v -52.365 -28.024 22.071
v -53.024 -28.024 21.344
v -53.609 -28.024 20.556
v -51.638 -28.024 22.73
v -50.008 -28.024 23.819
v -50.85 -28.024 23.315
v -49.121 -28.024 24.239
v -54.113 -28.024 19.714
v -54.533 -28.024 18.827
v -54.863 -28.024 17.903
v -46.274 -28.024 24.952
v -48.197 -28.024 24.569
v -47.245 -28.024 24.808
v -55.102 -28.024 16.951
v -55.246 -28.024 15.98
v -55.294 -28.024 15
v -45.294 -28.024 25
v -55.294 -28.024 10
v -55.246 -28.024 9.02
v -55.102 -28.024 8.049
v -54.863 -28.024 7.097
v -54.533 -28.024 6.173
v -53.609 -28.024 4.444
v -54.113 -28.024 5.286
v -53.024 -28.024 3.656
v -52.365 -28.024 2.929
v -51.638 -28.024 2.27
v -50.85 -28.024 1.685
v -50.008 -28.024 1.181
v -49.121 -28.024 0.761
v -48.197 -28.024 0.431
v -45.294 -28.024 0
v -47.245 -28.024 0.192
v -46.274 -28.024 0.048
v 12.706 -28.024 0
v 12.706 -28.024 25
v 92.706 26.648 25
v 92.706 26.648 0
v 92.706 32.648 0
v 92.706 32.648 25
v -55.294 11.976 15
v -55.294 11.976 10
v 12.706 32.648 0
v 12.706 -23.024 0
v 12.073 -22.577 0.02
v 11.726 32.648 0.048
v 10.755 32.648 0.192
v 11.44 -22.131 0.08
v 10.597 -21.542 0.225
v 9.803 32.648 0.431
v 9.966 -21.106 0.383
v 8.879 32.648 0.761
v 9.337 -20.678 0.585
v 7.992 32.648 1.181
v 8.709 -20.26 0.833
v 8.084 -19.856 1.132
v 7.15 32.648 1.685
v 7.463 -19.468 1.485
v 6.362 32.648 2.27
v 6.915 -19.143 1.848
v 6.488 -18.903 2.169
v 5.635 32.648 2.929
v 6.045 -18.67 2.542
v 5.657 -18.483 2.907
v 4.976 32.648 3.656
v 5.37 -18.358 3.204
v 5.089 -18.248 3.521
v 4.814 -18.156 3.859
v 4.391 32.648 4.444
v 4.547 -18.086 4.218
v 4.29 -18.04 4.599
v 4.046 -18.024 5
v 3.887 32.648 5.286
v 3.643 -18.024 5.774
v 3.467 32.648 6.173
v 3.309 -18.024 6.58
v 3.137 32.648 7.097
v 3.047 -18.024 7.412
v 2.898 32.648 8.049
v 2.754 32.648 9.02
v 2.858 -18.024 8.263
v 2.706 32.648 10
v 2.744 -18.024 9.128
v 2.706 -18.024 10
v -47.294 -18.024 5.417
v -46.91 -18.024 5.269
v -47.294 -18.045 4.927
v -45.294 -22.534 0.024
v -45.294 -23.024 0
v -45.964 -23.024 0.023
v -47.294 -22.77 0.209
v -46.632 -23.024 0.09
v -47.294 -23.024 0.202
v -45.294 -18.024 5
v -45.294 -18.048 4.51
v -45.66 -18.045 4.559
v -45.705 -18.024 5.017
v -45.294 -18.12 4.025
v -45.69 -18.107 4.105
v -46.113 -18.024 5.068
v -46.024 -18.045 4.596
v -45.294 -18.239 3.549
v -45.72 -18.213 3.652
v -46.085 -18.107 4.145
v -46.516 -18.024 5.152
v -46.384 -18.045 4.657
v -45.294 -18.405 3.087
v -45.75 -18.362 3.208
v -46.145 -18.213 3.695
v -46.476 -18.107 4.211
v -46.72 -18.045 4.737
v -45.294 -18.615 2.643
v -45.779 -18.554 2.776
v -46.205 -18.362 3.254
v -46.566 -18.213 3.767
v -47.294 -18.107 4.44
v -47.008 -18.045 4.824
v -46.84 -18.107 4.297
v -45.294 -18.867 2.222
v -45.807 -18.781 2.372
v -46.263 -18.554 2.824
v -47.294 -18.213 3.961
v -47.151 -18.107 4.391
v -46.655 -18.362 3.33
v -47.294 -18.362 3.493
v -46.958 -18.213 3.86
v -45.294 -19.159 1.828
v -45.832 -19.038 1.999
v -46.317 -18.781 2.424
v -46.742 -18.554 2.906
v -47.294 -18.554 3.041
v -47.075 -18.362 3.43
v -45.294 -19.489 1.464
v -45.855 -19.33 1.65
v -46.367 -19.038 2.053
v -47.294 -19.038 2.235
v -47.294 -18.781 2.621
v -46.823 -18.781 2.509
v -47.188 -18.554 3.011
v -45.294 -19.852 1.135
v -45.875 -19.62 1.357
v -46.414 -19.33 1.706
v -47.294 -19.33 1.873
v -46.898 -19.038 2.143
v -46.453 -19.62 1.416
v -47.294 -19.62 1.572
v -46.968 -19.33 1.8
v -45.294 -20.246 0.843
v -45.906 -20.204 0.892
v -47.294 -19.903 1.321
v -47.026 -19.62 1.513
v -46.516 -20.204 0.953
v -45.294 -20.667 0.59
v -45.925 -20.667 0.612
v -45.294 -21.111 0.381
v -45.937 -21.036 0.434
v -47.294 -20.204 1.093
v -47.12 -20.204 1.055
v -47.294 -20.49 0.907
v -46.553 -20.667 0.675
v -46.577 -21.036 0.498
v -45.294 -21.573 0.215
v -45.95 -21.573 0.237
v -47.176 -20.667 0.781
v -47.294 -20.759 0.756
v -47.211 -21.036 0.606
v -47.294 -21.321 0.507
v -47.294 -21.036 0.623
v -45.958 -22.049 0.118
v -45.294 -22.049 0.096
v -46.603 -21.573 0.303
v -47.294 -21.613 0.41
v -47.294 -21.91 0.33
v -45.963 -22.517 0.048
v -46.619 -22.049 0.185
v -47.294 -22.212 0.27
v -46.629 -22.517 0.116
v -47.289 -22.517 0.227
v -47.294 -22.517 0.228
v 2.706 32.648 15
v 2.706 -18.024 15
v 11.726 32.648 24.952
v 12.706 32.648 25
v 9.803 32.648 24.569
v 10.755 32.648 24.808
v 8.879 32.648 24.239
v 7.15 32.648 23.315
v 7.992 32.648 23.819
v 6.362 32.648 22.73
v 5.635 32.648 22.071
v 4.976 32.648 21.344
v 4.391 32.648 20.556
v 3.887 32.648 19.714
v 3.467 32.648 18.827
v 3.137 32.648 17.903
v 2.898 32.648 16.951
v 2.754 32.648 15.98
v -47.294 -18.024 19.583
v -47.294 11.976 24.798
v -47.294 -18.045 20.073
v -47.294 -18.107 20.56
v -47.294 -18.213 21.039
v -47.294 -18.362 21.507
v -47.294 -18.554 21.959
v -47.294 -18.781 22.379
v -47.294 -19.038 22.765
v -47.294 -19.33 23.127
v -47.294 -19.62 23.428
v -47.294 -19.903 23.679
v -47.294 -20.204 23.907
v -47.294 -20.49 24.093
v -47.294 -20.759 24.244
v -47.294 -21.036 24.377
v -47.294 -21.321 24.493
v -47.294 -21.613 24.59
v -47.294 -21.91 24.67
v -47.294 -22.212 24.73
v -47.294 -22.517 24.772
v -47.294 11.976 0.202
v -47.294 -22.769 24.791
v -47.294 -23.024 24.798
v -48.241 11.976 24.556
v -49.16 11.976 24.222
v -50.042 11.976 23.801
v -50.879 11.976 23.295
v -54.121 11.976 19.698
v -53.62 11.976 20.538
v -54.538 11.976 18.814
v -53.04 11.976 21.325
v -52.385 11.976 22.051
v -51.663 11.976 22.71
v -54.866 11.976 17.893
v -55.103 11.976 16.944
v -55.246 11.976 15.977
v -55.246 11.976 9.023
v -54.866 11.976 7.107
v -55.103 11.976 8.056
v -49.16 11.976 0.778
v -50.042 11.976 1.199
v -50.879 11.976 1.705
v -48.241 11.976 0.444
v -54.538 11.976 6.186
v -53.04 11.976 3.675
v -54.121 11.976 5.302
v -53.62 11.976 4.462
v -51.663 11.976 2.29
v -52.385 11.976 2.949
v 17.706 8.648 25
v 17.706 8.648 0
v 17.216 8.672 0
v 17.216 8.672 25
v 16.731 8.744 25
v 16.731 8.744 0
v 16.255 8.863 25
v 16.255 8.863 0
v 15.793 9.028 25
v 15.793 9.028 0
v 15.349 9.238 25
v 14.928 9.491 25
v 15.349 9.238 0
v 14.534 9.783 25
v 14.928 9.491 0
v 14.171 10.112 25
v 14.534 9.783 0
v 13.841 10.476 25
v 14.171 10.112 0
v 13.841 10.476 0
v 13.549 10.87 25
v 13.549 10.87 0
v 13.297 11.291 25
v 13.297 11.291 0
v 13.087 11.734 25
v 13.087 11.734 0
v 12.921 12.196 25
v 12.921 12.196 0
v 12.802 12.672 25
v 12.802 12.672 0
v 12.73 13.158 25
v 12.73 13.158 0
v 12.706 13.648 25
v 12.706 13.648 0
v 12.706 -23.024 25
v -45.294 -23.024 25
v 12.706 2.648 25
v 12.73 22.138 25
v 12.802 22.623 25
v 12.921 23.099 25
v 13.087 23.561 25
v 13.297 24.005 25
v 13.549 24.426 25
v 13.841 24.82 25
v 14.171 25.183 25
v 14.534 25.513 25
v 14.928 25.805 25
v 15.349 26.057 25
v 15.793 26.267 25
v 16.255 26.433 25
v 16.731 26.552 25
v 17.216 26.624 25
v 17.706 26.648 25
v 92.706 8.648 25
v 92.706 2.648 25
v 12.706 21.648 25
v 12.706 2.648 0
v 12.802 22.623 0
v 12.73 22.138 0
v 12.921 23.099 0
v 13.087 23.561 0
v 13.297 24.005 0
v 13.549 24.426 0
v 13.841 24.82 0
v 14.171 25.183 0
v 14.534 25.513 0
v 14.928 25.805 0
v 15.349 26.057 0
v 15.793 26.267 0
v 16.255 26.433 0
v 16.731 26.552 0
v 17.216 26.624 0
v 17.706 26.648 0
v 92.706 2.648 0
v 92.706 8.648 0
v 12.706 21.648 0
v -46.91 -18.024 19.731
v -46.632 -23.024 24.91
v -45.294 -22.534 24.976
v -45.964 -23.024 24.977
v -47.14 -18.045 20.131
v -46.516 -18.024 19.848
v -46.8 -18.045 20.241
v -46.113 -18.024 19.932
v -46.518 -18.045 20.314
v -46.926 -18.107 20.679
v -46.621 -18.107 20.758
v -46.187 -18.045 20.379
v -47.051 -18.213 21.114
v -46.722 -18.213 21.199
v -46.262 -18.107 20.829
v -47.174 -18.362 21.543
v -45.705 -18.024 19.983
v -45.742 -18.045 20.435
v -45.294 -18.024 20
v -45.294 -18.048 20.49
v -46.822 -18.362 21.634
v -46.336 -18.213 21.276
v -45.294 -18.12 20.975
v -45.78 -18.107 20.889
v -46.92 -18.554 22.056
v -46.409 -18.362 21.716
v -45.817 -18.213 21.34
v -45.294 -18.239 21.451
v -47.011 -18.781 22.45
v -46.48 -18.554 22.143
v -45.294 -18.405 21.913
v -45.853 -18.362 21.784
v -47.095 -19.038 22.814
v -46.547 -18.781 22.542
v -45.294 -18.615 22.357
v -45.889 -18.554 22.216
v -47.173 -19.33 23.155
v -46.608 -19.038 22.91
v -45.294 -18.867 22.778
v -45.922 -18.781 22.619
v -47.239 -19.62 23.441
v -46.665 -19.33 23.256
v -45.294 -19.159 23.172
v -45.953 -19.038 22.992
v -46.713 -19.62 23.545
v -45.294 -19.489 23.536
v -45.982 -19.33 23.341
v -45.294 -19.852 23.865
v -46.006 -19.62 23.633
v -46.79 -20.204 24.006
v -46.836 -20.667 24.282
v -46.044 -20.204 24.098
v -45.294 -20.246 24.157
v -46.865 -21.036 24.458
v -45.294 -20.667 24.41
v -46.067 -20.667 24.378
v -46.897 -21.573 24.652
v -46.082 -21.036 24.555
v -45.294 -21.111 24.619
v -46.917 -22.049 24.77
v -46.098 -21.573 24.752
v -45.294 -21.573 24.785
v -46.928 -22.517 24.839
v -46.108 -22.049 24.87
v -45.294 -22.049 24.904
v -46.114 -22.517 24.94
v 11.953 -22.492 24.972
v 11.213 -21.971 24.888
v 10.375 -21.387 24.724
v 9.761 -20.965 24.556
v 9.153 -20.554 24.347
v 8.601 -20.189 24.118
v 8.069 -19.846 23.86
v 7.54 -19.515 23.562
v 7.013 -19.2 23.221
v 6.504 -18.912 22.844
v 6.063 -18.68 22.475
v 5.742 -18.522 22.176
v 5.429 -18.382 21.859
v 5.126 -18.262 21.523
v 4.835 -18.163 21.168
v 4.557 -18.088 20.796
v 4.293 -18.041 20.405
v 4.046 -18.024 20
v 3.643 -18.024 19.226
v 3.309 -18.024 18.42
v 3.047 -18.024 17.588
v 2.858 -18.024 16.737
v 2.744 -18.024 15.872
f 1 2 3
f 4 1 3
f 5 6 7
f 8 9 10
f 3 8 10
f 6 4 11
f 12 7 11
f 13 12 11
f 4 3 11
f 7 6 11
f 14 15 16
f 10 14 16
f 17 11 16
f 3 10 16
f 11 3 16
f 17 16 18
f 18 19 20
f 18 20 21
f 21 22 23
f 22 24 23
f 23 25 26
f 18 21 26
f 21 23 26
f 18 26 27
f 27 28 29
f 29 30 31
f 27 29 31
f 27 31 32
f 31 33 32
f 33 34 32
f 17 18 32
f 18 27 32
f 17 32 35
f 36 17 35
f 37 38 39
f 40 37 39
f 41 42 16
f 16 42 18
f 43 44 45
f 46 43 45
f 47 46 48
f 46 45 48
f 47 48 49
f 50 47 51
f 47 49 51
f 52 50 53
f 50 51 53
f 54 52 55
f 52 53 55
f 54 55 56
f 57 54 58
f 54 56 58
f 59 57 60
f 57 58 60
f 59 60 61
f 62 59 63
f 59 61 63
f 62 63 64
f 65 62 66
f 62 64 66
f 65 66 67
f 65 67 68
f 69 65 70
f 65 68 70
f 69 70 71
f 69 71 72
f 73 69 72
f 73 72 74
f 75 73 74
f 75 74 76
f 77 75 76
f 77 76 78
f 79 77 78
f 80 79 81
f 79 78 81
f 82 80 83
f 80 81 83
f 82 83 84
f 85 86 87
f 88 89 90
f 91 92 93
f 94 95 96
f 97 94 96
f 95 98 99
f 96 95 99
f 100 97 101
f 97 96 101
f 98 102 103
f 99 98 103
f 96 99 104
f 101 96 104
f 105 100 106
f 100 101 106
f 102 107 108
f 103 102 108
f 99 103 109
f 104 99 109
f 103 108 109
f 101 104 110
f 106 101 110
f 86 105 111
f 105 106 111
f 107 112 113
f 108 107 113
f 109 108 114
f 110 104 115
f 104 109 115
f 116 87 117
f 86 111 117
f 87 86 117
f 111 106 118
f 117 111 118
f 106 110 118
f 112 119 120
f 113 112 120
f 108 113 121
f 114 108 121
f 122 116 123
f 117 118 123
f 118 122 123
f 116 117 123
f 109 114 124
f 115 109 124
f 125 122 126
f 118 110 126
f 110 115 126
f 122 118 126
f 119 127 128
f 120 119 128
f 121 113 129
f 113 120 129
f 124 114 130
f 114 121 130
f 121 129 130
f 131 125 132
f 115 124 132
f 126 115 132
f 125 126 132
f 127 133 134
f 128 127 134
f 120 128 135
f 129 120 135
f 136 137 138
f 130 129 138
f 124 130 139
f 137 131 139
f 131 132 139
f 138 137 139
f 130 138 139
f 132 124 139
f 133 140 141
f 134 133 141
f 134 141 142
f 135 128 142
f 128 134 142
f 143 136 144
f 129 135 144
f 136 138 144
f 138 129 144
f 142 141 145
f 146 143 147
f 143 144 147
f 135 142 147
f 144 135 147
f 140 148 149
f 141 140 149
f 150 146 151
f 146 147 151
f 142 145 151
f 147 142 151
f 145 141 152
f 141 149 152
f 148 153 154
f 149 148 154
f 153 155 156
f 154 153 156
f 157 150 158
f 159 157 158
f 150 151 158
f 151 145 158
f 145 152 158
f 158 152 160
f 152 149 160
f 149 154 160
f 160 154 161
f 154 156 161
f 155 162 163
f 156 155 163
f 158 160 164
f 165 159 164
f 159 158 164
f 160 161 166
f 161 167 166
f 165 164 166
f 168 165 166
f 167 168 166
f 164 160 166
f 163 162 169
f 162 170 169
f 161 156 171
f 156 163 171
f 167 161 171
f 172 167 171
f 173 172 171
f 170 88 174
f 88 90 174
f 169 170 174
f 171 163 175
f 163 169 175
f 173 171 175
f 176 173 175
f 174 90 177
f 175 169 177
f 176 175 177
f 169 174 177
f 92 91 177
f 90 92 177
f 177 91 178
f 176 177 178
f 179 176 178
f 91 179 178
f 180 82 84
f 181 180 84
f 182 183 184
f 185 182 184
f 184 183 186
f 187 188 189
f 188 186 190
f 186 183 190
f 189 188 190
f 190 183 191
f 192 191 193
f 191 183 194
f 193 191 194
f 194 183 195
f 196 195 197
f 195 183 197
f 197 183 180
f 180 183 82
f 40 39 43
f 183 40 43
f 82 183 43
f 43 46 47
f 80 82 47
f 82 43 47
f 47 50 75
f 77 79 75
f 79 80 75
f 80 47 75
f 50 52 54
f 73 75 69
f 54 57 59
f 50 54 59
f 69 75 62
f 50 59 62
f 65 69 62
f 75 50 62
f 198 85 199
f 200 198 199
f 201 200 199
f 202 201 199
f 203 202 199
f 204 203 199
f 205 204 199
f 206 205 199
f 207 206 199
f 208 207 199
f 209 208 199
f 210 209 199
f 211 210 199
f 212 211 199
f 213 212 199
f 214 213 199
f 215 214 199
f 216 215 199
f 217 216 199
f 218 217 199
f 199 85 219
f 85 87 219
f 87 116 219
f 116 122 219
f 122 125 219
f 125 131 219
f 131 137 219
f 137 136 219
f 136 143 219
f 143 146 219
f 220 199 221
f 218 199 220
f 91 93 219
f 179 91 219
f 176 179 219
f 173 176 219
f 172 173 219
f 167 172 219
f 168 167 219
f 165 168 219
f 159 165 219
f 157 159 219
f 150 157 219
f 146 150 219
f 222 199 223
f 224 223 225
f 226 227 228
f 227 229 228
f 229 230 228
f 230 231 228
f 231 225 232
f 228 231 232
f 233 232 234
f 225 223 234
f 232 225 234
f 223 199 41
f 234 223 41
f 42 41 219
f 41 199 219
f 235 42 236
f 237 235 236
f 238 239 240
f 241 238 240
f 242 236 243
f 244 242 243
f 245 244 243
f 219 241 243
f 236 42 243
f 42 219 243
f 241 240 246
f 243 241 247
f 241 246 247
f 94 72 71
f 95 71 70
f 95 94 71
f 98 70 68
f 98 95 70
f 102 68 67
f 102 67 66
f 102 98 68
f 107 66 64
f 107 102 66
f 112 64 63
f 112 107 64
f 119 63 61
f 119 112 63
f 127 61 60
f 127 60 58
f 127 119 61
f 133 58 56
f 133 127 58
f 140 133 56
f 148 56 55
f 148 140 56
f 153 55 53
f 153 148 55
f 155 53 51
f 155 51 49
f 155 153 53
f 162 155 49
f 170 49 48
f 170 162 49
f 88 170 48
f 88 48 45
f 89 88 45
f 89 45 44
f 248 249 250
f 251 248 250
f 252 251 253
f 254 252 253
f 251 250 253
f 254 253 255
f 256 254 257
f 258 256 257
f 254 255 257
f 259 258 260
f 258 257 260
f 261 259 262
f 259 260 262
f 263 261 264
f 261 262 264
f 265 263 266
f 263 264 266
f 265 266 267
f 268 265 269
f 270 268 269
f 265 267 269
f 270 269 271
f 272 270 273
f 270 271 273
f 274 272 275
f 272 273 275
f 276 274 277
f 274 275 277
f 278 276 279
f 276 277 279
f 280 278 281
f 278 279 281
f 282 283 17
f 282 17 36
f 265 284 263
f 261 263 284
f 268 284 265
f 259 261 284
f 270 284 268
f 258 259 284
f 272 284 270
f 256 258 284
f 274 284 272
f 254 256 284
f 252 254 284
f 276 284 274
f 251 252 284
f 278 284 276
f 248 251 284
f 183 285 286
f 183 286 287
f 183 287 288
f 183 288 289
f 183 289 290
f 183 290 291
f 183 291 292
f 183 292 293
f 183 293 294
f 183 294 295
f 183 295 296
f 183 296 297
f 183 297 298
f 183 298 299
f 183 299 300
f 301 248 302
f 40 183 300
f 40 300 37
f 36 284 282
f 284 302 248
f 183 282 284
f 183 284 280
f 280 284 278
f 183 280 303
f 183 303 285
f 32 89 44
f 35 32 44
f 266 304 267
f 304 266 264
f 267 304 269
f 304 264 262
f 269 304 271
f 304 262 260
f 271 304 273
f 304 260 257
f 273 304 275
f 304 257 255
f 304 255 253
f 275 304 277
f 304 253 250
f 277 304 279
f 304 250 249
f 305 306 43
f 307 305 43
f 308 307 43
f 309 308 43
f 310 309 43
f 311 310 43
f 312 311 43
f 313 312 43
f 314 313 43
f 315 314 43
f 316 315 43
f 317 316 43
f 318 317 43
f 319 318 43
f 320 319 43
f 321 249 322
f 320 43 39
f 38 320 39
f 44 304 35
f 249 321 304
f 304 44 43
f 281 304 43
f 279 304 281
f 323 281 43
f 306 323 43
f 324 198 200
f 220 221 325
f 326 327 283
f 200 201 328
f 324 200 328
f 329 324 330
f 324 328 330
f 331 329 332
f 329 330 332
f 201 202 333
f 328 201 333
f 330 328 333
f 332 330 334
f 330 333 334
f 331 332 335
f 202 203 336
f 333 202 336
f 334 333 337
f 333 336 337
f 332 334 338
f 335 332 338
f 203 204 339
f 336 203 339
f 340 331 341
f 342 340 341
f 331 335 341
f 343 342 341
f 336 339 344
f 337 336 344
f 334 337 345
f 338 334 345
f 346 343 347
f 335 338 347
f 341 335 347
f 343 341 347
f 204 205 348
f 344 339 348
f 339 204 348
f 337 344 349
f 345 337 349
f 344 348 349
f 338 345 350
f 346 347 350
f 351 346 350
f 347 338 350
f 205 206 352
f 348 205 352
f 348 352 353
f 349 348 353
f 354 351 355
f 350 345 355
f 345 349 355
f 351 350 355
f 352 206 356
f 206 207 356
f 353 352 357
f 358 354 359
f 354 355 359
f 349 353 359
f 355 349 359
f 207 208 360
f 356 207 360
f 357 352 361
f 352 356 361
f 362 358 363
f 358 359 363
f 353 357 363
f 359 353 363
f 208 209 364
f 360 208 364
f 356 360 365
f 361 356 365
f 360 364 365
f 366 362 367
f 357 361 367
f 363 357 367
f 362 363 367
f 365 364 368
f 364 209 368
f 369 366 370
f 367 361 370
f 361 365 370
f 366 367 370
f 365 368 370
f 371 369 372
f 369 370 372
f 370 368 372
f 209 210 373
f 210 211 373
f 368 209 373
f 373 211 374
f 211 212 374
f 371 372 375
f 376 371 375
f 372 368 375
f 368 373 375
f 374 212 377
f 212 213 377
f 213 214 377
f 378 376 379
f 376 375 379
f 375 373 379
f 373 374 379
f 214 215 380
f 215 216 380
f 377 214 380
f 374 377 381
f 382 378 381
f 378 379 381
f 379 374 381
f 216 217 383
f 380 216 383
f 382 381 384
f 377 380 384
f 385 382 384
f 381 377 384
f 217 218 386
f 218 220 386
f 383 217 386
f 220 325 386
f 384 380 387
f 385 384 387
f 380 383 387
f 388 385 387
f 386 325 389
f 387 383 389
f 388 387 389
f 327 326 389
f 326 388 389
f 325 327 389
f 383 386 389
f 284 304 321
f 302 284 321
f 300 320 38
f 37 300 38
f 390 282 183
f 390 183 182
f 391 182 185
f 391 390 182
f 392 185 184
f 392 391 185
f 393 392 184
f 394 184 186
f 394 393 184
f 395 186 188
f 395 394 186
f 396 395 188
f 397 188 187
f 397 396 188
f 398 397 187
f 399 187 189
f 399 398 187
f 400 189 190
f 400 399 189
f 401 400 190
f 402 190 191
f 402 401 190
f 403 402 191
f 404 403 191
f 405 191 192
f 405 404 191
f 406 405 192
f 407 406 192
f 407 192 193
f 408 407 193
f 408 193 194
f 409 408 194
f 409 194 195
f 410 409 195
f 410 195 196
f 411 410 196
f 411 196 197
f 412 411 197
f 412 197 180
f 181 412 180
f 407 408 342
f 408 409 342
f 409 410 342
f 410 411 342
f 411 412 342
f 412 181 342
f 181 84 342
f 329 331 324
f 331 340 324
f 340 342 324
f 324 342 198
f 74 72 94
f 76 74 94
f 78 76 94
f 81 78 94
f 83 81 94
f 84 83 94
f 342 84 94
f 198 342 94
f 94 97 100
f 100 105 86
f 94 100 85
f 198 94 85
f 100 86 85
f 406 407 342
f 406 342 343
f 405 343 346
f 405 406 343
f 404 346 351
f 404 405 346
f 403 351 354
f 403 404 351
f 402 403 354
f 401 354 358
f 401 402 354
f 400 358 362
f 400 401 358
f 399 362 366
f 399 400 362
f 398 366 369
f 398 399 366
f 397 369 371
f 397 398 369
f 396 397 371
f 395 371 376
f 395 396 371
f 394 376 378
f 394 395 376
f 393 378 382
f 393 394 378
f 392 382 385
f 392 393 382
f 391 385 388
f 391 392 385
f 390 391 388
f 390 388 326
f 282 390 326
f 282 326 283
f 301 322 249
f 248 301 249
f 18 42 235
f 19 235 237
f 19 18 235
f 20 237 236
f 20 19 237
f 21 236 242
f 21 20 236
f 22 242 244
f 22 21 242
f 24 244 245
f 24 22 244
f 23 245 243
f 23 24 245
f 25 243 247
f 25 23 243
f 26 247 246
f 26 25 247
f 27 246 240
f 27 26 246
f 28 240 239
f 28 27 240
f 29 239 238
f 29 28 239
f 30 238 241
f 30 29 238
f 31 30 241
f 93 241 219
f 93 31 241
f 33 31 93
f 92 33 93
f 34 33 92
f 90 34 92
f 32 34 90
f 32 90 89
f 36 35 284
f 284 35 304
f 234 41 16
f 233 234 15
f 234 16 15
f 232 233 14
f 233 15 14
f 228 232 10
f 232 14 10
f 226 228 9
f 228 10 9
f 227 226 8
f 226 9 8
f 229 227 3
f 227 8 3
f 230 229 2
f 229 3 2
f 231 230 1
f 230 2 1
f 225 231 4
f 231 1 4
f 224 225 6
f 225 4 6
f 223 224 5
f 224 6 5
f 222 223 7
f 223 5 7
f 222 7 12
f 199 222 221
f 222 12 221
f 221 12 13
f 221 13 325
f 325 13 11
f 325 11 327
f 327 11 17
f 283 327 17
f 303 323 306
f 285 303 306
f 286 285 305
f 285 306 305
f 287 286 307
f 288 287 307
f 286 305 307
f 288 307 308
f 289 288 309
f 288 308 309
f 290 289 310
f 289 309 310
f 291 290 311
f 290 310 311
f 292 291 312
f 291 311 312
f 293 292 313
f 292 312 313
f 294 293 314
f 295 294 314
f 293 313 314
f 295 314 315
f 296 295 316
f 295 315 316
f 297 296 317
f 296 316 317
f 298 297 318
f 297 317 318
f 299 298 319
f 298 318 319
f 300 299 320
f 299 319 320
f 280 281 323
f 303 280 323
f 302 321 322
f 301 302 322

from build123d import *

# Parameters (mm, degrees)
EXTRUDE_1_DEPTH = 25
FILLET_2_R      = 10
FILLET_3_R      = 10
FILLET_4_R      = 10
FILLET_6_R      = 5


with BuildPart() as part:
    # 草圖1 → 填料-伸長1 (new body)
    with BuildSketch(Plane.XY):
        with BuildLine():
            Line((-55.29380505, 11.975806452), (-55.29380505, -28.024193548))
            Line((-55.29380505, -28.024193548), (12.70619495, -28.024193548))
            Line((12.70619495, -28.024193548), (12.70619495, 2.647849462))
            Line((12.70619495, 2.647849462), (92.70619495, 2.647849462))
            Line((92.70619495, 2.647849462), (92.70619495, 8.647849462))
            Line((92.70619495, 8.647849462), (17.70619495, 8.647849462))
            ThreePointArc((17.70619495, 8.647849462), (14.170661044, 10.112315556), (12.70619495, 13.647849462))
            Line((12.70619495, 13.647849462), (12.70619495, 21.647849462))
            ThreePointArc((12.70619495, 21.647849462), (14.170661044, 25.183383368), (17.70619495, 26.647849462))
            Line((17.70619495, 26.647849462), (92.70619495, 26.647849462))
            Line((92.70619495, 26.647849462), (92.70619495, 32.647849462))
            Line((92.70619495, 32.647849462), (2.70619495, 32.647849462))
            Line((2.70619495, 32.647849462), (2.70619495, -18.024193548))
            Line((2.70619495, -18.024193548), (-47.29380505, -18.024193548))
            Line((-47.29380505, -18.024193548), (-47.29380505, 11.975806452))
            Line((-47.29380505, 11.975806452), (-55.29380505, 11.975806452))
        make_face()
    extrude(amount=EXTRUDE_1_DEPTH)

    # 圓角2
    fillet_2_edges = [part.edges().sort_by_distance(p)[0] for p in [
        (-55.29380505, -8.024193548, 0),
    ]]
    fillet(fillet_2_edges, radius=FILLET_2_R)

    # 圓角3
    fillet_3_edges = [part.edges().sort_by_distance(p)[0] for p in [
        (-55.29380505, -8.024193548, 25),
    ]]
    fillet(fillet_3_edges, radius=FILLET_3_R)

    # 圓角4
    fillet_4_edges = [part.edges().sort_by_distance(p)[0] for p in [
        (2.70619495, 7.311827957, 0),
        (2.70619495, 7.311827957, 25),
    ]]
    fillet(fillet_4_edges, radius=FILLET_4_R - 0.0001)  # a hair under: the kernel refuses the full size

    # 圓角6
    fillet_6_edges = [part.edges().sort_by_distance(p)[0] for p in [
        (-16.29385505, -18.024193548, 0),
        (-16.29385505, -18.024193548, 25),
        (-46.29889467, -18.024193548, 0.05063847),
        (-46.29889467, -18.024193548, 24.94936153),
    ]]
    fillet(fillet_6_edges, radius=FILLET_6_R)


solid = part.part
